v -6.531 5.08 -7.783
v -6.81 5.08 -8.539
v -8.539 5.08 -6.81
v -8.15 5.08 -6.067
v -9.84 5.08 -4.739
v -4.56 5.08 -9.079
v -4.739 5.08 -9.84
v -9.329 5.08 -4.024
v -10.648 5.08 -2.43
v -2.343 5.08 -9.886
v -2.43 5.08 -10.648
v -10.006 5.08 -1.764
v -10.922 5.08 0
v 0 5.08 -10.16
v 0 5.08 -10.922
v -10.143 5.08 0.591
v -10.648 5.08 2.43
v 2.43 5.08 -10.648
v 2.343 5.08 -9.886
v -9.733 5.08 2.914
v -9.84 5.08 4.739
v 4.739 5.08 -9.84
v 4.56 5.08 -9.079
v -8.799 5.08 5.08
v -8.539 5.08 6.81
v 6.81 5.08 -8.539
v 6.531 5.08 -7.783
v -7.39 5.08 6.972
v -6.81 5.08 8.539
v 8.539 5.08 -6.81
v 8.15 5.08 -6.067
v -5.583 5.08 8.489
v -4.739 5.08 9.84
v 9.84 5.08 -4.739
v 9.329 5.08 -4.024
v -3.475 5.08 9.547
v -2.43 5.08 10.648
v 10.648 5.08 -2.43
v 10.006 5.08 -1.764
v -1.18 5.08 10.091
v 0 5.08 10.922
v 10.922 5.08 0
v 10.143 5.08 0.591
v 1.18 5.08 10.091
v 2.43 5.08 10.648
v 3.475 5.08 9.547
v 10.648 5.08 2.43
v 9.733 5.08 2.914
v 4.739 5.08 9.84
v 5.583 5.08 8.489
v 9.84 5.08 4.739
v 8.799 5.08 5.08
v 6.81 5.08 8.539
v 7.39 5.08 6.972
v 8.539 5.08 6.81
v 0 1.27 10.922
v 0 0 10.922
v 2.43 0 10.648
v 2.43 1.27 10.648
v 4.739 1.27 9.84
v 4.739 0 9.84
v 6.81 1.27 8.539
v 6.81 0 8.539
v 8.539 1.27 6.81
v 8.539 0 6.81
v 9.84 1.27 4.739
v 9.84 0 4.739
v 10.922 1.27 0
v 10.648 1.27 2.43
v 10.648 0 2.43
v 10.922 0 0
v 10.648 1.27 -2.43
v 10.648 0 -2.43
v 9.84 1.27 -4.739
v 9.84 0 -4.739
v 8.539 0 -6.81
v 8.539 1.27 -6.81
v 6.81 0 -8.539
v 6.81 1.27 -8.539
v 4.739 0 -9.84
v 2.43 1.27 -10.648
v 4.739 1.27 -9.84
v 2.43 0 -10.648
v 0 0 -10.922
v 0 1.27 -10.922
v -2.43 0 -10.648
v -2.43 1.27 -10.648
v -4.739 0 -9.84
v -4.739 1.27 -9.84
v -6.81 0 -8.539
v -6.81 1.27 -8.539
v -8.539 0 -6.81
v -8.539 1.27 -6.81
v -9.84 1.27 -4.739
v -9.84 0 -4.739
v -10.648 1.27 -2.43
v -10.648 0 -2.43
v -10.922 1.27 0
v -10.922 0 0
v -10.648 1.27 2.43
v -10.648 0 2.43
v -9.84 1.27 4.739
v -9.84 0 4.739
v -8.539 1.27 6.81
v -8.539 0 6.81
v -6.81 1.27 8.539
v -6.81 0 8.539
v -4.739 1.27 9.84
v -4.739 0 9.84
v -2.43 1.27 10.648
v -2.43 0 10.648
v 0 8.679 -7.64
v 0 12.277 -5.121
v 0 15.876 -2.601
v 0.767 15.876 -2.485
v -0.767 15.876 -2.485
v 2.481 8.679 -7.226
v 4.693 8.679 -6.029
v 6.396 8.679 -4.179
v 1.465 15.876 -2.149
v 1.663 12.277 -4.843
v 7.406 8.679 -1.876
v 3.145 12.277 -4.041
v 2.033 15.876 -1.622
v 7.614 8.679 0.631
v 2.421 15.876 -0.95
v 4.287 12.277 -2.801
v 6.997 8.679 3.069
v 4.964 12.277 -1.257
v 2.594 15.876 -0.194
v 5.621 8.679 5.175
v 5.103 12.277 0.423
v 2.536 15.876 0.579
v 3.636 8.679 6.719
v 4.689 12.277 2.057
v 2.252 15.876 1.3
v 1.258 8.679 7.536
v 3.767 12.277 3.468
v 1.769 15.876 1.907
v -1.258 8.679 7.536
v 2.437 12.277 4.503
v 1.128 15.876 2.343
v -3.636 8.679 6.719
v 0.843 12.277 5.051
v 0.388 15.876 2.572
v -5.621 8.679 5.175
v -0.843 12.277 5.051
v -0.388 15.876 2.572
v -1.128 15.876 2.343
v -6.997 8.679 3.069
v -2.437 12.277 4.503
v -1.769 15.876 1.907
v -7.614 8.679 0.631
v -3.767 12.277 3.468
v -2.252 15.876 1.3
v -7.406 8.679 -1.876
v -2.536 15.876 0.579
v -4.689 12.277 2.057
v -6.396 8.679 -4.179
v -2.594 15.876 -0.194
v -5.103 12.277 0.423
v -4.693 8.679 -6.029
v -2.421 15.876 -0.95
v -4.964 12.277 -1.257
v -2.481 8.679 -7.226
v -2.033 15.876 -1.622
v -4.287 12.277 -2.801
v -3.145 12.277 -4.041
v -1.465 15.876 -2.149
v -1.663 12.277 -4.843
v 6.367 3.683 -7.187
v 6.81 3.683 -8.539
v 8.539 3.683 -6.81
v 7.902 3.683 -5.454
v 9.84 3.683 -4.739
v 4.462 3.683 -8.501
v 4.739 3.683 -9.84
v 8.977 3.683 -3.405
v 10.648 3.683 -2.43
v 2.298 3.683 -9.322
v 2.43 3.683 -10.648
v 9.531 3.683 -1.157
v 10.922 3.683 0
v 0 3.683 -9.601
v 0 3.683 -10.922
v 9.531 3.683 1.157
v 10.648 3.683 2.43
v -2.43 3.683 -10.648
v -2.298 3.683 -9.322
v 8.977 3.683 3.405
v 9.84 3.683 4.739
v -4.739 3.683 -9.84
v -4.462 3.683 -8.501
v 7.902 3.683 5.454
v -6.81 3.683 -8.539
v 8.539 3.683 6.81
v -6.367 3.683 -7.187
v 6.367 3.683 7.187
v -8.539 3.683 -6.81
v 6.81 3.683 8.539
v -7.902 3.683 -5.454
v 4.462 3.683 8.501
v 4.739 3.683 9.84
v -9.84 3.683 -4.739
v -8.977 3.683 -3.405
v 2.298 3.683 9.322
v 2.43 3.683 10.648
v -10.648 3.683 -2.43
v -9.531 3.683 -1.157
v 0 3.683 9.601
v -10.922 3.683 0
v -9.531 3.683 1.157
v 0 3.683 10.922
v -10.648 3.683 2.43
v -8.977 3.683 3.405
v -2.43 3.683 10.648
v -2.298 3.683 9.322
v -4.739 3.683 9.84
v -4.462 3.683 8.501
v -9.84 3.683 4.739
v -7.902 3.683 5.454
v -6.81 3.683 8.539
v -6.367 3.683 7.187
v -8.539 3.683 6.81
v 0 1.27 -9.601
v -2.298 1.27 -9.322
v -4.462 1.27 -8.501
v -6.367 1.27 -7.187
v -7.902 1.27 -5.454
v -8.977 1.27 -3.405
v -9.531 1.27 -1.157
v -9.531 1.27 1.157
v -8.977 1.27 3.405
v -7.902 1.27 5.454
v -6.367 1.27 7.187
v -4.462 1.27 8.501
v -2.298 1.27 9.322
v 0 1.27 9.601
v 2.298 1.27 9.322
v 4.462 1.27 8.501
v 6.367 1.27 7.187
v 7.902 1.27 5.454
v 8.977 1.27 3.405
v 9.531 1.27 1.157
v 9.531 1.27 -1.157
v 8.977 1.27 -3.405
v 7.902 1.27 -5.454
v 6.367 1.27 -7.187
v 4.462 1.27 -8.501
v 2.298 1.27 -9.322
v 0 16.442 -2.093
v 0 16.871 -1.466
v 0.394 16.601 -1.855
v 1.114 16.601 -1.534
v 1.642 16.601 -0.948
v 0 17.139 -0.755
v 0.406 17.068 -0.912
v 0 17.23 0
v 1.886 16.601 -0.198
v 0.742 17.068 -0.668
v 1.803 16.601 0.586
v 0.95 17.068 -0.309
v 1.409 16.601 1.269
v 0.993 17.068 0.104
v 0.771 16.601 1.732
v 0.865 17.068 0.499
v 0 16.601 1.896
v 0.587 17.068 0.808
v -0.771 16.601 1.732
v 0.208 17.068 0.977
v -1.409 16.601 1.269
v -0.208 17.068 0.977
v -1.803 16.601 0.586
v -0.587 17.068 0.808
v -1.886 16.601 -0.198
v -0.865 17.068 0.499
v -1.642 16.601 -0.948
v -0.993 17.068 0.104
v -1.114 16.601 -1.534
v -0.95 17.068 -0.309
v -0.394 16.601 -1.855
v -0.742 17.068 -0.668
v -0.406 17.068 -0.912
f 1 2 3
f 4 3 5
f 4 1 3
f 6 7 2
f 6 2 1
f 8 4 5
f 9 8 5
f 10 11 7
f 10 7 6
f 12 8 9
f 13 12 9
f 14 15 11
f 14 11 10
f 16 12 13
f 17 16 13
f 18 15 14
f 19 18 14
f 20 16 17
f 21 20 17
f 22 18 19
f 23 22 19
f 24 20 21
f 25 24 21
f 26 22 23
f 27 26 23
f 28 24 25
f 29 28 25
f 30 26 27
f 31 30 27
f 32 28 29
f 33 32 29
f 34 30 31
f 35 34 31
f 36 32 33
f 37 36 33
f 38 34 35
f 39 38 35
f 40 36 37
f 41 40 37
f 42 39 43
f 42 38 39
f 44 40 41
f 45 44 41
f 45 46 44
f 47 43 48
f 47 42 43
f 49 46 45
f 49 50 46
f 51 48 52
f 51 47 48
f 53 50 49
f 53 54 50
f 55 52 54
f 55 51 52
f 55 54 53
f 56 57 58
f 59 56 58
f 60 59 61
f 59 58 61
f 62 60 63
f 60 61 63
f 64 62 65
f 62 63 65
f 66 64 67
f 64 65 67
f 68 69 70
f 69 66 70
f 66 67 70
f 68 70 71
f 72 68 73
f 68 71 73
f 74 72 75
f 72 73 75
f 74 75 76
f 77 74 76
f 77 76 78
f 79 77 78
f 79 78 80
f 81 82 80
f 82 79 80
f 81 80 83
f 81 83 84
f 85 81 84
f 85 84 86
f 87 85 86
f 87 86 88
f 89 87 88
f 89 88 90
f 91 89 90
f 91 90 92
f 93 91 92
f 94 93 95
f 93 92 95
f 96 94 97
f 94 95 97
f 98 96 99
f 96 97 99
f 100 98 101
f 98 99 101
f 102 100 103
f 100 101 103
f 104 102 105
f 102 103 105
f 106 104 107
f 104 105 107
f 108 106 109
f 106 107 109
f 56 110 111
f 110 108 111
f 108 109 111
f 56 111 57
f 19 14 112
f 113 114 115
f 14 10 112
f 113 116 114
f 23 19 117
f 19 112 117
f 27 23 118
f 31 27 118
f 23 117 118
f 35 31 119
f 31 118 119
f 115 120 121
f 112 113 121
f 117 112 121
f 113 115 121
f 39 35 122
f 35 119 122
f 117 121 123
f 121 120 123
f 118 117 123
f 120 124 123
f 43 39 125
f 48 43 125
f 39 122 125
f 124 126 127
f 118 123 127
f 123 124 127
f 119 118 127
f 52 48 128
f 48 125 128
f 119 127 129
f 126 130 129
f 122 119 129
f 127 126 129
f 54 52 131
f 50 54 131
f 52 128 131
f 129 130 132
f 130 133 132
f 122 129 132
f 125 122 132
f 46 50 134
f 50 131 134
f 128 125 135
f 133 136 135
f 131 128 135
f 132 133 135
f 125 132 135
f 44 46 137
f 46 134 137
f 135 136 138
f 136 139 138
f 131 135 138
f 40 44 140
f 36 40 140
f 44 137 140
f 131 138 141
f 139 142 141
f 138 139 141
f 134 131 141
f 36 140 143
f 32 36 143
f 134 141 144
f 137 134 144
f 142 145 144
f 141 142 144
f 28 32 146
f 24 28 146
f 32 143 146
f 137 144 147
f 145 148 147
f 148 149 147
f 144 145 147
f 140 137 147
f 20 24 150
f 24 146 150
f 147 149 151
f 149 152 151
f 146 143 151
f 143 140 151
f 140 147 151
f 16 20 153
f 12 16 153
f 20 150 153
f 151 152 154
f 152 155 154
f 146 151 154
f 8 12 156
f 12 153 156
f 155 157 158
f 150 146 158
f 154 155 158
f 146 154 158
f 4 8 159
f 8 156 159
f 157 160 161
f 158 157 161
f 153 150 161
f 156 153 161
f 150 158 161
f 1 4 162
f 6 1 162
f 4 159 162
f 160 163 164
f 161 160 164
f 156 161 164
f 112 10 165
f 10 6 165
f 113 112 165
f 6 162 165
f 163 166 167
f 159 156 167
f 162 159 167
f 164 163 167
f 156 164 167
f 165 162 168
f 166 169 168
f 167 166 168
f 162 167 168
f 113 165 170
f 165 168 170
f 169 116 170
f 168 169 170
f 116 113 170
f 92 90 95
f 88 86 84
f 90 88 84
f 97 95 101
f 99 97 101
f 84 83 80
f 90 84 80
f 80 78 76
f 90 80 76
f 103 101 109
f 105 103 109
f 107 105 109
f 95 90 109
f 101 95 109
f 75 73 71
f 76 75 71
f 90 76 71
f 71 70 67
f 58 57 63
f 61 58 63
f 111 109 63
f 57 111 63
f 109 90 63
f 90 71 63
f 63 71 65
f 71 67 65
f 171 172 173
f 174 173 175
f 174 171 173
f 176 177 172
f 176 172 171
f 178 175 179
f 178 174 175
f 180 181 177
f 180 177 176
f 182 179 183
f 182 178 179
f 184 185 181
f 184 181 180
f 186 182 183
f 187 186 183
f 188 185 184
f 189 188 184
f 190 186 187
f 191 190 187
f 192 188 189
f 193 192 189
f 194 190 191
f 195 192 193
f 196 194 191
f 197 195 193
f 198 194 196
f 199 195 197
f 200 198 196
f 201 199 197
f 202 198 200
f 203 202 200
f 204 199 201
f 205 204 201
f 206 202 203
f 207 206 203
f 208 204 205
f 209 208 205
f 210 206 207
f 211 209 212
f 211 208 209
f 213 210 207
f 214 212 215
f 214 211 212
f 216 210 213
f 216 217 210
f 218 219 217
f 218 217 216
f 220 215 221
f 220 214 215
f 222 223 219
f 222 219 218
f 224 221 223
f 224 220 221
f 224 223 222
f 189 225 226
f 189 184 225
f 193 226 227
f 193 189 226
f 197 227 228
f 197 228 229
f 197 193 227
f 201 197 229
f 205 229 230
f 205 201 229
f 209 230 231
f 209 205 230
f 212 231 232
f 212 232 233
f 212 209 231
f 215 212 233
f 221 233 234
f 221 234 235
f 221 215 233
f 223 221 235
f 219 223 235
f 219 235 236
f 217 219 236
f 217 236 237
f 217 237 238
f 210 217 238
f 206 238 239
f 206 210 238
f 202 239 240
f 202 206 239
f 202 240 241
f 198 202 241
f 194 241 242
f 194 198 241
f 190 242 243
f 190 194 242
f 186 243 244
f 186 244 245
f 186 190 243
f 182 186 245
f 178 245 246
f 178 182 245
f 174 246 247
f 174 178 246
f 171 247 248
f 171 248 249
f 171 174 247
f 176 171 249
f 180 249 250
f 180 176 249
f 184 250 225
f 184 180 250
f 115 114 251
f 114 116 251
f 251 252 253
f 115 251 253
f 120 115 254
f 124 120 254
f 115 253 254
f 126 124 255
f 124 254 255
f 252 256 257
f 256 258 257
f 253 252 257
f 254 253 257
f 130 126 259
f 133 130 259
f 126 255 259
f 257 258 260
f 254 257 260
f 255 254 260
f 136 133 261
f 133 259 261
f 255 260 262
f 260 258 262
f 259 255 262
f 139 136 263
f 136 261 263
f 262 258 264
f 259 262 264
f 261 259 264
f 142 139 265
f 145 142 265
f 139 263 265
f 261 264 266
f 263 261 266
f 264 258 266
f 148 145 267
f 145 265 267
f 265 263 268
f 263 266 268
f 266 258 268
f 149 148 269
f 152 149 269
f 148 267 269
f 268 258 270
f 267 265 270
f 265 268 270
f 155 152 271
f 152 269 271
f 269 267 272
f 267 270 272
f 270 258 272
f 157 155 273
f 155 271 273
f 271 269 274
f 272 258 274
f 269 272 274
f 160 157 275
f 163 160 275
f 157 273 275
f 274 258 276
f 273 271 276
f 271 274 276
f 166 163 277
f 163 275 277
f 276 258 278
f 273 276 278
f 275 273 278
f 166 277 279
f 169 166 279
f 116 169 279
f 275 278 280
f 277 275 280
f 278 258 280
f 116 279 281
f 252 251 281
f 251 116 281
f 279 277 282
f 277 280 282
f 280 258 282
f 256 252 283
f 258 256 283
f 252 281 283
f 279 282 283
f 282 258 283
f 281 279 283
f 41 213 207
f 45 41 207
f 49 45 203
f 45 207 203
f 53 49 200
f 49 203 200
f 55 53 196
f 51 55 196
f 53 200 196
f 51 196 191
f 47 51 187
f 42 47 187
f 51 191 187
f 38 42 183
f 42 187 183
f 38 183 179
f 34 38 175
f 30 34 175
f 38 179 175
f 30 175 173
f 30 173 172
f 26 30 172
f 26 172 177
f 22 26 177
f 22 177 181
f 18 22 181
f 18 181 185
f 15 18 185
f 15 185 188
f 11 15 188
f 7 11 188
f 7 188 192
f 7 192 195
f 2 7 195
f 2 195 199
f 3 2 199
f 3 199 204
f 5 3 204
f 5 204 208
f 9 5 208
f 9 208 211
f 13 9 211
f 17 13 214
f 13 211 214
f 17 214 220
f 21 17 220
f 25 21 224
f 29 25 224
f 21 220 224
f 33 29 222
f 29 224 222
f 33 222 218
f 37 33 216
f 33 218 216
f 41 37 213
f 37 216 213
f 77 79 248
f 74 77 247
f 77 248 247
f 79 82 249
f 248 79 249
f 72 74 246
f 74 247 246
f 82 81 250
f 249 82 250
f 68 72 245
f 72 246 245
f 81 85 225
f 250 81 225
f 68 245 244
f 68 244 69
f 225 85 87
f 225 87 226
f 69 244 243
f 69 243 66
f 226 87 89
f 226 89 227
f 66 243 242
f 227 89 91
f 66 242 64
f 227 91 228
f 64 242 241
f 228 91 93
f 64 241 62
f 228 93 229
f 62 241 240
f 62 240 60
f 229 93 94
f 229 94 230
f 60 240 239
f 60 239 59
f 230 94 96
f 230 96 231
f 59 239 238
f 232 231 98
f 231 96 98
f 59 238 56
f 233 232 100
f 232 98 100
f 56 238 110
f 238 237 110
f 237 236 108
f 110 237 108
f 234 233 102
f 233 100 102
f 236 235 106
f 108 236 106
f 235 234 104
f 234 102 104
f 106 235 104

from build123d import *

# Parameters (mm, degrees)
SKETCH1_R           = 10.922
BOSS_EXTRUDE1_DEPTH = 5.08
SKETCH4_W           = 2.413
SKETCH4_H           = 2.413


with BuildPart() as part:
    # Sketch1 → Boss-Extrude1 (new body)
    with BuildSketch(Plane(origin=(0, 0, 0), x_dir=(1, 0, 0), z_dir=(0, 1, 0))):
        with Locations(Location((0, 0, 0), (0, 0, 270))):
            Circle(SKETCH1_R)
    extrude(amount=BOSS_EXTRUDE1_DEPTH)

    # Sketch4 → Cut-Revolve1 (revolve, cut)
    with BuildSketch(Plane.XY, mode=Mode.PRIVATE) as cut_revolve1_sk:
        with Locations((10.8077, 2.4765)):
            Rectangle(SKETCH4_W, SKETCH4_H)
    revolve(cut_revolve1_sk.sketch.rotate(Axis((0, 0, 0), (0, 1, 0)), 90), axis=Axis((0, 0, 0), (0, 1, 0)), mode=Mode.SUBTRACT)

    # Sketch5 → Revolve1 (revolve)
    with BuildSketch(Plane.XY, mode=Mode.PRIVATE) as revolve1_sk:
        with BuildLine():
            Line((10.16, 5.08), (2.600807741, 15.875645358))
            ThreePointArc((2.600807741, 15.875645358), (1.466051847, 16.870799568), (0, 17.229540172))
            Line((0, 17.229540172), (0, 5.08))
            Line((0, 5.08), (10.16, 5.08))
        make_face()
    revolve(revolve1_sk.sketch.rotate(Axis((0, 21.184130684, 0), (0, -1, 0)), 270), axis=Axis((0, 21.184130684, 0), (0, -1, 0)))


solid = part.part
